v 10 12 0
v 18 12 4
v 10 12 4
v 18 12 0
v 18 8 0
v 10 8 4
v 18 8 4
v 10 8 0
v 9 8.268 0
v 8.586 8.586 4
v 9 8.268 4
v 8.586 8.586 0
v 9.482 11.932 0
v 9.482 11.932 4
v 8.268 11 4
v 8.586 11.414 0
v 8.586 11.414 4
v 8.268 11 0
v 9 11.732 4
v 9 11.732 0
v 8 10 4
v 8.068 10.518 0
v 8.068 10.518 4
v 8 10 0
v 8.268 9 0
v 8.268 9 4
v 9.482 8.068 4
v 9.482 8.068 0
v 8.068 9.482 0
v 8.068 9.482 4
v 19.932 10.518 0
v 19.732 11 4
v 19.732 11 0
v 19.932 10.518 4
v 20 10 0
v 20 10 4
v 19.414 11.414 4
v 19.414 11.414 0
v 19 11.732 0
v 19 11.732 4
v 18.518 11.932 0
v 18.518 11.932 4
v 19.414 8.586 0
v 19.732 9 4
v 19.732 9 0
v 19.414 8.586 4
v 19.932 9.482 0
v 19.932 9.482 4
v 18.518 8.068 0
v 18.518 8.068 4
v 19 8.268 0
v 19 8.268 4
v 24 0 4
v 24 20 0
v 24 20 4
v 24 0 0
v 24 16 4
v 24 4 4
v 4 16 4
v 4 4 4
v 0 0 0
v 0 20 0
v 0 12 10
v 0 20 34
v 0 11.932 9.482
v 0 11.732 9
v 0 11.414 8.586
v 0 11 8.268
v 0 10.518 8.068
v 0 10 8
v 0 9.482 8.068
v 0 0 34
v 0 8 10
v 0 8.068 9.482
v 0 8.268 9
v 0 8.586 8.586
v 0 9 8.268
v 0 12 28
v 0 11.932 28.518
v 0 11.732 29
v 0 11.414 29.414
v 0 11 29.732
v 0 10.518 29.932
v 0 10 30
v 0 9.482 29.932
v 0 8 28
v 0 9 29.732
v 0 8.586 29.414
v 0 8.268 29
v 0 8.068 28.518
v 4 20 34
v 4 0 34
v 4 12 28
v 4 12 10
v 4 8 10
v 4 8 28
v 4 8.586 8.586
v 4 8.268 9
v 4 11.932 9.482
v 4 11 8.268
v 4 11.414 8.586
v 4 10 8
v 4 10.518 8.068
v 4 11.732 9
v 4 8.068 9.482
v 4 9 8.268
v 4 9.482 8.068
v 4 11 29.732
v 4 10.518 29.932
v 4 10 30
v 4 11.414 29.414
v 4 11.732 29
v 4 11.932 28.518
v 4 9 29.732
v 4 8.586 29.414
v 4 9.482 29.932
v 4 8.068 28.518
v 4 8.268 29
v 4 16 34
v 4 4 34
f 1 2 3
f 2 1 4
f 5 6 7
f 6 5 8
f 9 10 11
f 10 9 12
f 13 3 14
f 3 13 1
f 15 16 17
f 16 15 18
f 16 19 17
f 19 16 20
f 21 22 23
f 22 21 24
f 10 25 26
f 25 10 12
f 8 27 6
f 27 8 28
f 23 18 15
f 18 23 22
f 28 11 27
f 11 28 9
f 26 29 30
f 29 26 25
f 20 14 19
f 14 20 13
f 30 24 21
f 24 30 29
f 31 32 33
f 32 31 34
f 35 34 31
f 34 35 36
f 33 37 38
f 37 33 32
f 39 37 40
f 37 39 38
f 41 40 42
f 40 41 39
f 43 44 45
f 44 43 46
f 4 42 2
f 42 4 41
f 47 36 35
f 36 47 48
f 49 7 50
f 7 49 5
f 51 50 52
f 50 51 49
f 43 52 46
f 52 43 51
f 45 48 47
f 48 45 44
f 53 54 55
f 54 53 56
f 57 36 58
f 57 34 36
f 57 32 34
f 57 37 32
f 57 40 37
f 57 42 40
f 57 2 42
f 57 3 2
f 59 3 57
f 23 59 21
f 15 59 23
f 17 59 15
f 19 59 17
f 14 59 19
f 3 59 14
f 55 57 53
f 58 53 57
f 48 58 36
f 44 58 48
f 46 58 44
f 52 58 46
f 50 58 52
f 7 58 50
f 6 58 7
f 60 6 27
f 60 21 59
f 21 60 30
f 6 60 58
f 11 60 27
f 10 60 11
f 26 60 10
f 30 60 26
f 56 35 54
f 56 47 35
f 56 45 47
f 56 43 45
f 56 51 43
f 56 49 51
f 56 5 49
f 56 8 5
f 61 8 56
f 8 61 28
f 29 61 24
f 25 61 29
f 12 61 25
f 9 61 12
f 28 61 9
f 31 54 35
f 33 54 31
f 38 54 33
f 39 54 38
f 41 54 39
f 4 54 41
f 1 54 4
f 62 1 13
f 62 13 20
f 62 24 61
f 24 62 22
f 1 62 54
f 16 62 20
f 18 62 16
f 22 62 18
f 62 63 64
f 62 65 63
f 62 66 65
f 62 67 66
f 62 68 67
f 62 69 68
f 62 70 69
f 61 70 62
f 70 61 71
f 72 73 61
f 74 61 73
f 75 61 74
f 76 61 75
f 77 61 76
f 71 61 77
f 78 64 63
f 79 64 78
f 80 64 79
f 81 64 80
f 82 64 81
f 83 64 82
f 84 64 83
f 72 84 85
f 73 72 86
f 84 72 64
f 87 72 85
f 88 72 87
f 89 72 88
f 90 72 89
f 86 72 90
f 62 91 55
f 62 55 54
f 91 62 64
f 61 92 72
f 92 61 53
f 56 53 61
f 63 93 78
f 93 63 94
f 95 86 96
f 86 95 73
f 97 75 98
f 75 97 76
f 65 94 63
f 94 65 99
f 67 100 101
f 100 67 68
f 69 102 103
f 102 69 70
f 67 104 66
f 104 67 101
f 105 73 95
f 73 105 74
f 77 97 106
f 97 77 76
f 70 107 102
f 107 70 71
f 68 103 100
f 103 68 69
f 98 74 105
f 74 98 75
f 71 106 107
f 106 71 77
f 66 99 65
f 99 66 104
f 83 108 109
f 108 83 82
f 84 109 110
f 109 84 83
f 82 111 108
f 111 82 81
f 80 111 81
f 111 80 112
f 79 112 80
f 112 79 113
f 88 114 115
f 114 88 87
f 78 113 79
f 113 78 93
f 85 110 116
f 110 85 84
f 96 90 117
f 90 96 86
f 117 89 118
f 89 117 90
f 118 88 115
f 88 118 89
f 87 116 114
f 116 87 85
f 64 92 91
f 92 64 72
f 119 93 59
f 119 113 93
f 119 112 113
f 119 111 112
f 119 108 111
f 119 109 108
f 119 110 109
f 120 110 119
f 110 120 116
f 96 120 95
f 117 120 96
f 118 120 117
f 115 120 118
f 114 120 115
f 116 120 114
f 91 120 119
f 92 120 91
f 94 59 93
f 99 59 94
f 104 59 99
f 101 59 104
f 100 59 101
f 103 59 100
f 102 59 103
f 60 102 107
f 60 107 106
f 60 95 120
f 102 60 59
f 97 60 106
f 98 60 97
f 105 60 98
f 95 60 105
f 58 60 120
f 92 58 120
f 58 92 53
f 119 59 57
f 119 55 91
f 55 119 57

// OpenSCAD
//=============================================================================
// l-bracket.scad
//
// generates an l-bracket from the given parameters
//=============================================================================
// CHANGELOG
//
// v1.1 - makes side lengths independant, set $fn
// v1.0 - original release
//=============================================================================
// Written in 2018 by Patrick Barrett
//
// To the extent possible under law, the author(s) have dedicated all copyright
// and related and neighboring rights to this work to the public domain
// worldwide. This work is distributed without any warranty.
//
// See <http://creativecommons.org/publicdomain/zero/1.0/> for full dedication.
//=============================================================================


L_Bracket();

$fn = 24;

module stadium3d(a, r, z, center = false){
	offset_x = center ? -(r + (a / 2)) : 0;
	offset_y = center ? -(r) : 0;
	offset_z = center ? -(z / 2) : 0;

	translate([offset_x, offset_y, offset_z])
	union() {
		translate([r, 0, 0])
			cube([a, 2*r, z]);
		translate([r, r, 0])
			cylinder(h = z, r = r, center = false);
		translate([r + a, r, 0])
			cylinder(h = z, r = r);
	}
}

module L_Bracket(wall_thickness = 4,
                   internal_width = 12, //Ezt kell a lap vastagságára beállítani
                   slot_width = 4,
                   side_length_v = 30,
                   side_length_h = 20,)
{

    // customizable variables end here

    head_annulus = (internal_width/2) - (slot_width/2);

    abit = 0.0001 * 1; //use for making overlap to get single manifold stl
    union() {
        // horizontal wall
        difference() {
            cube([side_length_h + wall_thickness,
                  internal_width + 2*wall_thickness,
                  wall_thickness]);
            translate([wall_thickness + head_annulus,
                       wall_thickness + head_annulus,
                       -1])
                stadium3d(side_length_h - (2*head_annulus) - slot_width,
                          slot_width / 2,
                          wall_thickness + 2);
        }

        // vertiacle wall
        translate([wall_thickness, 0, 0])
        rotate([0,-90,0])
        difference() {
            cube([side_length_v + wall_thickness,
                  internal_width + 2*wall_thickness,
                  wall_thickness]);
            translate([wall_thickness + head_annulus,
                       wall_thickness + head_annulus,
                       -1])
                stadium3d(side_length_v - (2*head_annulus) - slot_width,
                          slot_width / 2,
                          wall_thickness + 2);
        }

        // bracer 1
        translate([wall_thickness - abit,
                   wall_thickness,
                   wall_thickness - abit])
        rotate([90,0,0])
        linear_extrude(height = wall_thickness) {
            polygon([[0,0],
                    [side_length_h,0],
                    [0,side_length_v]]);
        }

        // bracer 2
        translate([wall_thickness - abit,
                   2*wall_thickness + internal_width,
                   wall_thickness - abit])
        rotate([90,0,0])
        linear_extrude(height = wall_thickness) {
            polygon([[0,0],
                    [side_length_h,0],
                    [0,side_length_v]]);
        }
    }
}
